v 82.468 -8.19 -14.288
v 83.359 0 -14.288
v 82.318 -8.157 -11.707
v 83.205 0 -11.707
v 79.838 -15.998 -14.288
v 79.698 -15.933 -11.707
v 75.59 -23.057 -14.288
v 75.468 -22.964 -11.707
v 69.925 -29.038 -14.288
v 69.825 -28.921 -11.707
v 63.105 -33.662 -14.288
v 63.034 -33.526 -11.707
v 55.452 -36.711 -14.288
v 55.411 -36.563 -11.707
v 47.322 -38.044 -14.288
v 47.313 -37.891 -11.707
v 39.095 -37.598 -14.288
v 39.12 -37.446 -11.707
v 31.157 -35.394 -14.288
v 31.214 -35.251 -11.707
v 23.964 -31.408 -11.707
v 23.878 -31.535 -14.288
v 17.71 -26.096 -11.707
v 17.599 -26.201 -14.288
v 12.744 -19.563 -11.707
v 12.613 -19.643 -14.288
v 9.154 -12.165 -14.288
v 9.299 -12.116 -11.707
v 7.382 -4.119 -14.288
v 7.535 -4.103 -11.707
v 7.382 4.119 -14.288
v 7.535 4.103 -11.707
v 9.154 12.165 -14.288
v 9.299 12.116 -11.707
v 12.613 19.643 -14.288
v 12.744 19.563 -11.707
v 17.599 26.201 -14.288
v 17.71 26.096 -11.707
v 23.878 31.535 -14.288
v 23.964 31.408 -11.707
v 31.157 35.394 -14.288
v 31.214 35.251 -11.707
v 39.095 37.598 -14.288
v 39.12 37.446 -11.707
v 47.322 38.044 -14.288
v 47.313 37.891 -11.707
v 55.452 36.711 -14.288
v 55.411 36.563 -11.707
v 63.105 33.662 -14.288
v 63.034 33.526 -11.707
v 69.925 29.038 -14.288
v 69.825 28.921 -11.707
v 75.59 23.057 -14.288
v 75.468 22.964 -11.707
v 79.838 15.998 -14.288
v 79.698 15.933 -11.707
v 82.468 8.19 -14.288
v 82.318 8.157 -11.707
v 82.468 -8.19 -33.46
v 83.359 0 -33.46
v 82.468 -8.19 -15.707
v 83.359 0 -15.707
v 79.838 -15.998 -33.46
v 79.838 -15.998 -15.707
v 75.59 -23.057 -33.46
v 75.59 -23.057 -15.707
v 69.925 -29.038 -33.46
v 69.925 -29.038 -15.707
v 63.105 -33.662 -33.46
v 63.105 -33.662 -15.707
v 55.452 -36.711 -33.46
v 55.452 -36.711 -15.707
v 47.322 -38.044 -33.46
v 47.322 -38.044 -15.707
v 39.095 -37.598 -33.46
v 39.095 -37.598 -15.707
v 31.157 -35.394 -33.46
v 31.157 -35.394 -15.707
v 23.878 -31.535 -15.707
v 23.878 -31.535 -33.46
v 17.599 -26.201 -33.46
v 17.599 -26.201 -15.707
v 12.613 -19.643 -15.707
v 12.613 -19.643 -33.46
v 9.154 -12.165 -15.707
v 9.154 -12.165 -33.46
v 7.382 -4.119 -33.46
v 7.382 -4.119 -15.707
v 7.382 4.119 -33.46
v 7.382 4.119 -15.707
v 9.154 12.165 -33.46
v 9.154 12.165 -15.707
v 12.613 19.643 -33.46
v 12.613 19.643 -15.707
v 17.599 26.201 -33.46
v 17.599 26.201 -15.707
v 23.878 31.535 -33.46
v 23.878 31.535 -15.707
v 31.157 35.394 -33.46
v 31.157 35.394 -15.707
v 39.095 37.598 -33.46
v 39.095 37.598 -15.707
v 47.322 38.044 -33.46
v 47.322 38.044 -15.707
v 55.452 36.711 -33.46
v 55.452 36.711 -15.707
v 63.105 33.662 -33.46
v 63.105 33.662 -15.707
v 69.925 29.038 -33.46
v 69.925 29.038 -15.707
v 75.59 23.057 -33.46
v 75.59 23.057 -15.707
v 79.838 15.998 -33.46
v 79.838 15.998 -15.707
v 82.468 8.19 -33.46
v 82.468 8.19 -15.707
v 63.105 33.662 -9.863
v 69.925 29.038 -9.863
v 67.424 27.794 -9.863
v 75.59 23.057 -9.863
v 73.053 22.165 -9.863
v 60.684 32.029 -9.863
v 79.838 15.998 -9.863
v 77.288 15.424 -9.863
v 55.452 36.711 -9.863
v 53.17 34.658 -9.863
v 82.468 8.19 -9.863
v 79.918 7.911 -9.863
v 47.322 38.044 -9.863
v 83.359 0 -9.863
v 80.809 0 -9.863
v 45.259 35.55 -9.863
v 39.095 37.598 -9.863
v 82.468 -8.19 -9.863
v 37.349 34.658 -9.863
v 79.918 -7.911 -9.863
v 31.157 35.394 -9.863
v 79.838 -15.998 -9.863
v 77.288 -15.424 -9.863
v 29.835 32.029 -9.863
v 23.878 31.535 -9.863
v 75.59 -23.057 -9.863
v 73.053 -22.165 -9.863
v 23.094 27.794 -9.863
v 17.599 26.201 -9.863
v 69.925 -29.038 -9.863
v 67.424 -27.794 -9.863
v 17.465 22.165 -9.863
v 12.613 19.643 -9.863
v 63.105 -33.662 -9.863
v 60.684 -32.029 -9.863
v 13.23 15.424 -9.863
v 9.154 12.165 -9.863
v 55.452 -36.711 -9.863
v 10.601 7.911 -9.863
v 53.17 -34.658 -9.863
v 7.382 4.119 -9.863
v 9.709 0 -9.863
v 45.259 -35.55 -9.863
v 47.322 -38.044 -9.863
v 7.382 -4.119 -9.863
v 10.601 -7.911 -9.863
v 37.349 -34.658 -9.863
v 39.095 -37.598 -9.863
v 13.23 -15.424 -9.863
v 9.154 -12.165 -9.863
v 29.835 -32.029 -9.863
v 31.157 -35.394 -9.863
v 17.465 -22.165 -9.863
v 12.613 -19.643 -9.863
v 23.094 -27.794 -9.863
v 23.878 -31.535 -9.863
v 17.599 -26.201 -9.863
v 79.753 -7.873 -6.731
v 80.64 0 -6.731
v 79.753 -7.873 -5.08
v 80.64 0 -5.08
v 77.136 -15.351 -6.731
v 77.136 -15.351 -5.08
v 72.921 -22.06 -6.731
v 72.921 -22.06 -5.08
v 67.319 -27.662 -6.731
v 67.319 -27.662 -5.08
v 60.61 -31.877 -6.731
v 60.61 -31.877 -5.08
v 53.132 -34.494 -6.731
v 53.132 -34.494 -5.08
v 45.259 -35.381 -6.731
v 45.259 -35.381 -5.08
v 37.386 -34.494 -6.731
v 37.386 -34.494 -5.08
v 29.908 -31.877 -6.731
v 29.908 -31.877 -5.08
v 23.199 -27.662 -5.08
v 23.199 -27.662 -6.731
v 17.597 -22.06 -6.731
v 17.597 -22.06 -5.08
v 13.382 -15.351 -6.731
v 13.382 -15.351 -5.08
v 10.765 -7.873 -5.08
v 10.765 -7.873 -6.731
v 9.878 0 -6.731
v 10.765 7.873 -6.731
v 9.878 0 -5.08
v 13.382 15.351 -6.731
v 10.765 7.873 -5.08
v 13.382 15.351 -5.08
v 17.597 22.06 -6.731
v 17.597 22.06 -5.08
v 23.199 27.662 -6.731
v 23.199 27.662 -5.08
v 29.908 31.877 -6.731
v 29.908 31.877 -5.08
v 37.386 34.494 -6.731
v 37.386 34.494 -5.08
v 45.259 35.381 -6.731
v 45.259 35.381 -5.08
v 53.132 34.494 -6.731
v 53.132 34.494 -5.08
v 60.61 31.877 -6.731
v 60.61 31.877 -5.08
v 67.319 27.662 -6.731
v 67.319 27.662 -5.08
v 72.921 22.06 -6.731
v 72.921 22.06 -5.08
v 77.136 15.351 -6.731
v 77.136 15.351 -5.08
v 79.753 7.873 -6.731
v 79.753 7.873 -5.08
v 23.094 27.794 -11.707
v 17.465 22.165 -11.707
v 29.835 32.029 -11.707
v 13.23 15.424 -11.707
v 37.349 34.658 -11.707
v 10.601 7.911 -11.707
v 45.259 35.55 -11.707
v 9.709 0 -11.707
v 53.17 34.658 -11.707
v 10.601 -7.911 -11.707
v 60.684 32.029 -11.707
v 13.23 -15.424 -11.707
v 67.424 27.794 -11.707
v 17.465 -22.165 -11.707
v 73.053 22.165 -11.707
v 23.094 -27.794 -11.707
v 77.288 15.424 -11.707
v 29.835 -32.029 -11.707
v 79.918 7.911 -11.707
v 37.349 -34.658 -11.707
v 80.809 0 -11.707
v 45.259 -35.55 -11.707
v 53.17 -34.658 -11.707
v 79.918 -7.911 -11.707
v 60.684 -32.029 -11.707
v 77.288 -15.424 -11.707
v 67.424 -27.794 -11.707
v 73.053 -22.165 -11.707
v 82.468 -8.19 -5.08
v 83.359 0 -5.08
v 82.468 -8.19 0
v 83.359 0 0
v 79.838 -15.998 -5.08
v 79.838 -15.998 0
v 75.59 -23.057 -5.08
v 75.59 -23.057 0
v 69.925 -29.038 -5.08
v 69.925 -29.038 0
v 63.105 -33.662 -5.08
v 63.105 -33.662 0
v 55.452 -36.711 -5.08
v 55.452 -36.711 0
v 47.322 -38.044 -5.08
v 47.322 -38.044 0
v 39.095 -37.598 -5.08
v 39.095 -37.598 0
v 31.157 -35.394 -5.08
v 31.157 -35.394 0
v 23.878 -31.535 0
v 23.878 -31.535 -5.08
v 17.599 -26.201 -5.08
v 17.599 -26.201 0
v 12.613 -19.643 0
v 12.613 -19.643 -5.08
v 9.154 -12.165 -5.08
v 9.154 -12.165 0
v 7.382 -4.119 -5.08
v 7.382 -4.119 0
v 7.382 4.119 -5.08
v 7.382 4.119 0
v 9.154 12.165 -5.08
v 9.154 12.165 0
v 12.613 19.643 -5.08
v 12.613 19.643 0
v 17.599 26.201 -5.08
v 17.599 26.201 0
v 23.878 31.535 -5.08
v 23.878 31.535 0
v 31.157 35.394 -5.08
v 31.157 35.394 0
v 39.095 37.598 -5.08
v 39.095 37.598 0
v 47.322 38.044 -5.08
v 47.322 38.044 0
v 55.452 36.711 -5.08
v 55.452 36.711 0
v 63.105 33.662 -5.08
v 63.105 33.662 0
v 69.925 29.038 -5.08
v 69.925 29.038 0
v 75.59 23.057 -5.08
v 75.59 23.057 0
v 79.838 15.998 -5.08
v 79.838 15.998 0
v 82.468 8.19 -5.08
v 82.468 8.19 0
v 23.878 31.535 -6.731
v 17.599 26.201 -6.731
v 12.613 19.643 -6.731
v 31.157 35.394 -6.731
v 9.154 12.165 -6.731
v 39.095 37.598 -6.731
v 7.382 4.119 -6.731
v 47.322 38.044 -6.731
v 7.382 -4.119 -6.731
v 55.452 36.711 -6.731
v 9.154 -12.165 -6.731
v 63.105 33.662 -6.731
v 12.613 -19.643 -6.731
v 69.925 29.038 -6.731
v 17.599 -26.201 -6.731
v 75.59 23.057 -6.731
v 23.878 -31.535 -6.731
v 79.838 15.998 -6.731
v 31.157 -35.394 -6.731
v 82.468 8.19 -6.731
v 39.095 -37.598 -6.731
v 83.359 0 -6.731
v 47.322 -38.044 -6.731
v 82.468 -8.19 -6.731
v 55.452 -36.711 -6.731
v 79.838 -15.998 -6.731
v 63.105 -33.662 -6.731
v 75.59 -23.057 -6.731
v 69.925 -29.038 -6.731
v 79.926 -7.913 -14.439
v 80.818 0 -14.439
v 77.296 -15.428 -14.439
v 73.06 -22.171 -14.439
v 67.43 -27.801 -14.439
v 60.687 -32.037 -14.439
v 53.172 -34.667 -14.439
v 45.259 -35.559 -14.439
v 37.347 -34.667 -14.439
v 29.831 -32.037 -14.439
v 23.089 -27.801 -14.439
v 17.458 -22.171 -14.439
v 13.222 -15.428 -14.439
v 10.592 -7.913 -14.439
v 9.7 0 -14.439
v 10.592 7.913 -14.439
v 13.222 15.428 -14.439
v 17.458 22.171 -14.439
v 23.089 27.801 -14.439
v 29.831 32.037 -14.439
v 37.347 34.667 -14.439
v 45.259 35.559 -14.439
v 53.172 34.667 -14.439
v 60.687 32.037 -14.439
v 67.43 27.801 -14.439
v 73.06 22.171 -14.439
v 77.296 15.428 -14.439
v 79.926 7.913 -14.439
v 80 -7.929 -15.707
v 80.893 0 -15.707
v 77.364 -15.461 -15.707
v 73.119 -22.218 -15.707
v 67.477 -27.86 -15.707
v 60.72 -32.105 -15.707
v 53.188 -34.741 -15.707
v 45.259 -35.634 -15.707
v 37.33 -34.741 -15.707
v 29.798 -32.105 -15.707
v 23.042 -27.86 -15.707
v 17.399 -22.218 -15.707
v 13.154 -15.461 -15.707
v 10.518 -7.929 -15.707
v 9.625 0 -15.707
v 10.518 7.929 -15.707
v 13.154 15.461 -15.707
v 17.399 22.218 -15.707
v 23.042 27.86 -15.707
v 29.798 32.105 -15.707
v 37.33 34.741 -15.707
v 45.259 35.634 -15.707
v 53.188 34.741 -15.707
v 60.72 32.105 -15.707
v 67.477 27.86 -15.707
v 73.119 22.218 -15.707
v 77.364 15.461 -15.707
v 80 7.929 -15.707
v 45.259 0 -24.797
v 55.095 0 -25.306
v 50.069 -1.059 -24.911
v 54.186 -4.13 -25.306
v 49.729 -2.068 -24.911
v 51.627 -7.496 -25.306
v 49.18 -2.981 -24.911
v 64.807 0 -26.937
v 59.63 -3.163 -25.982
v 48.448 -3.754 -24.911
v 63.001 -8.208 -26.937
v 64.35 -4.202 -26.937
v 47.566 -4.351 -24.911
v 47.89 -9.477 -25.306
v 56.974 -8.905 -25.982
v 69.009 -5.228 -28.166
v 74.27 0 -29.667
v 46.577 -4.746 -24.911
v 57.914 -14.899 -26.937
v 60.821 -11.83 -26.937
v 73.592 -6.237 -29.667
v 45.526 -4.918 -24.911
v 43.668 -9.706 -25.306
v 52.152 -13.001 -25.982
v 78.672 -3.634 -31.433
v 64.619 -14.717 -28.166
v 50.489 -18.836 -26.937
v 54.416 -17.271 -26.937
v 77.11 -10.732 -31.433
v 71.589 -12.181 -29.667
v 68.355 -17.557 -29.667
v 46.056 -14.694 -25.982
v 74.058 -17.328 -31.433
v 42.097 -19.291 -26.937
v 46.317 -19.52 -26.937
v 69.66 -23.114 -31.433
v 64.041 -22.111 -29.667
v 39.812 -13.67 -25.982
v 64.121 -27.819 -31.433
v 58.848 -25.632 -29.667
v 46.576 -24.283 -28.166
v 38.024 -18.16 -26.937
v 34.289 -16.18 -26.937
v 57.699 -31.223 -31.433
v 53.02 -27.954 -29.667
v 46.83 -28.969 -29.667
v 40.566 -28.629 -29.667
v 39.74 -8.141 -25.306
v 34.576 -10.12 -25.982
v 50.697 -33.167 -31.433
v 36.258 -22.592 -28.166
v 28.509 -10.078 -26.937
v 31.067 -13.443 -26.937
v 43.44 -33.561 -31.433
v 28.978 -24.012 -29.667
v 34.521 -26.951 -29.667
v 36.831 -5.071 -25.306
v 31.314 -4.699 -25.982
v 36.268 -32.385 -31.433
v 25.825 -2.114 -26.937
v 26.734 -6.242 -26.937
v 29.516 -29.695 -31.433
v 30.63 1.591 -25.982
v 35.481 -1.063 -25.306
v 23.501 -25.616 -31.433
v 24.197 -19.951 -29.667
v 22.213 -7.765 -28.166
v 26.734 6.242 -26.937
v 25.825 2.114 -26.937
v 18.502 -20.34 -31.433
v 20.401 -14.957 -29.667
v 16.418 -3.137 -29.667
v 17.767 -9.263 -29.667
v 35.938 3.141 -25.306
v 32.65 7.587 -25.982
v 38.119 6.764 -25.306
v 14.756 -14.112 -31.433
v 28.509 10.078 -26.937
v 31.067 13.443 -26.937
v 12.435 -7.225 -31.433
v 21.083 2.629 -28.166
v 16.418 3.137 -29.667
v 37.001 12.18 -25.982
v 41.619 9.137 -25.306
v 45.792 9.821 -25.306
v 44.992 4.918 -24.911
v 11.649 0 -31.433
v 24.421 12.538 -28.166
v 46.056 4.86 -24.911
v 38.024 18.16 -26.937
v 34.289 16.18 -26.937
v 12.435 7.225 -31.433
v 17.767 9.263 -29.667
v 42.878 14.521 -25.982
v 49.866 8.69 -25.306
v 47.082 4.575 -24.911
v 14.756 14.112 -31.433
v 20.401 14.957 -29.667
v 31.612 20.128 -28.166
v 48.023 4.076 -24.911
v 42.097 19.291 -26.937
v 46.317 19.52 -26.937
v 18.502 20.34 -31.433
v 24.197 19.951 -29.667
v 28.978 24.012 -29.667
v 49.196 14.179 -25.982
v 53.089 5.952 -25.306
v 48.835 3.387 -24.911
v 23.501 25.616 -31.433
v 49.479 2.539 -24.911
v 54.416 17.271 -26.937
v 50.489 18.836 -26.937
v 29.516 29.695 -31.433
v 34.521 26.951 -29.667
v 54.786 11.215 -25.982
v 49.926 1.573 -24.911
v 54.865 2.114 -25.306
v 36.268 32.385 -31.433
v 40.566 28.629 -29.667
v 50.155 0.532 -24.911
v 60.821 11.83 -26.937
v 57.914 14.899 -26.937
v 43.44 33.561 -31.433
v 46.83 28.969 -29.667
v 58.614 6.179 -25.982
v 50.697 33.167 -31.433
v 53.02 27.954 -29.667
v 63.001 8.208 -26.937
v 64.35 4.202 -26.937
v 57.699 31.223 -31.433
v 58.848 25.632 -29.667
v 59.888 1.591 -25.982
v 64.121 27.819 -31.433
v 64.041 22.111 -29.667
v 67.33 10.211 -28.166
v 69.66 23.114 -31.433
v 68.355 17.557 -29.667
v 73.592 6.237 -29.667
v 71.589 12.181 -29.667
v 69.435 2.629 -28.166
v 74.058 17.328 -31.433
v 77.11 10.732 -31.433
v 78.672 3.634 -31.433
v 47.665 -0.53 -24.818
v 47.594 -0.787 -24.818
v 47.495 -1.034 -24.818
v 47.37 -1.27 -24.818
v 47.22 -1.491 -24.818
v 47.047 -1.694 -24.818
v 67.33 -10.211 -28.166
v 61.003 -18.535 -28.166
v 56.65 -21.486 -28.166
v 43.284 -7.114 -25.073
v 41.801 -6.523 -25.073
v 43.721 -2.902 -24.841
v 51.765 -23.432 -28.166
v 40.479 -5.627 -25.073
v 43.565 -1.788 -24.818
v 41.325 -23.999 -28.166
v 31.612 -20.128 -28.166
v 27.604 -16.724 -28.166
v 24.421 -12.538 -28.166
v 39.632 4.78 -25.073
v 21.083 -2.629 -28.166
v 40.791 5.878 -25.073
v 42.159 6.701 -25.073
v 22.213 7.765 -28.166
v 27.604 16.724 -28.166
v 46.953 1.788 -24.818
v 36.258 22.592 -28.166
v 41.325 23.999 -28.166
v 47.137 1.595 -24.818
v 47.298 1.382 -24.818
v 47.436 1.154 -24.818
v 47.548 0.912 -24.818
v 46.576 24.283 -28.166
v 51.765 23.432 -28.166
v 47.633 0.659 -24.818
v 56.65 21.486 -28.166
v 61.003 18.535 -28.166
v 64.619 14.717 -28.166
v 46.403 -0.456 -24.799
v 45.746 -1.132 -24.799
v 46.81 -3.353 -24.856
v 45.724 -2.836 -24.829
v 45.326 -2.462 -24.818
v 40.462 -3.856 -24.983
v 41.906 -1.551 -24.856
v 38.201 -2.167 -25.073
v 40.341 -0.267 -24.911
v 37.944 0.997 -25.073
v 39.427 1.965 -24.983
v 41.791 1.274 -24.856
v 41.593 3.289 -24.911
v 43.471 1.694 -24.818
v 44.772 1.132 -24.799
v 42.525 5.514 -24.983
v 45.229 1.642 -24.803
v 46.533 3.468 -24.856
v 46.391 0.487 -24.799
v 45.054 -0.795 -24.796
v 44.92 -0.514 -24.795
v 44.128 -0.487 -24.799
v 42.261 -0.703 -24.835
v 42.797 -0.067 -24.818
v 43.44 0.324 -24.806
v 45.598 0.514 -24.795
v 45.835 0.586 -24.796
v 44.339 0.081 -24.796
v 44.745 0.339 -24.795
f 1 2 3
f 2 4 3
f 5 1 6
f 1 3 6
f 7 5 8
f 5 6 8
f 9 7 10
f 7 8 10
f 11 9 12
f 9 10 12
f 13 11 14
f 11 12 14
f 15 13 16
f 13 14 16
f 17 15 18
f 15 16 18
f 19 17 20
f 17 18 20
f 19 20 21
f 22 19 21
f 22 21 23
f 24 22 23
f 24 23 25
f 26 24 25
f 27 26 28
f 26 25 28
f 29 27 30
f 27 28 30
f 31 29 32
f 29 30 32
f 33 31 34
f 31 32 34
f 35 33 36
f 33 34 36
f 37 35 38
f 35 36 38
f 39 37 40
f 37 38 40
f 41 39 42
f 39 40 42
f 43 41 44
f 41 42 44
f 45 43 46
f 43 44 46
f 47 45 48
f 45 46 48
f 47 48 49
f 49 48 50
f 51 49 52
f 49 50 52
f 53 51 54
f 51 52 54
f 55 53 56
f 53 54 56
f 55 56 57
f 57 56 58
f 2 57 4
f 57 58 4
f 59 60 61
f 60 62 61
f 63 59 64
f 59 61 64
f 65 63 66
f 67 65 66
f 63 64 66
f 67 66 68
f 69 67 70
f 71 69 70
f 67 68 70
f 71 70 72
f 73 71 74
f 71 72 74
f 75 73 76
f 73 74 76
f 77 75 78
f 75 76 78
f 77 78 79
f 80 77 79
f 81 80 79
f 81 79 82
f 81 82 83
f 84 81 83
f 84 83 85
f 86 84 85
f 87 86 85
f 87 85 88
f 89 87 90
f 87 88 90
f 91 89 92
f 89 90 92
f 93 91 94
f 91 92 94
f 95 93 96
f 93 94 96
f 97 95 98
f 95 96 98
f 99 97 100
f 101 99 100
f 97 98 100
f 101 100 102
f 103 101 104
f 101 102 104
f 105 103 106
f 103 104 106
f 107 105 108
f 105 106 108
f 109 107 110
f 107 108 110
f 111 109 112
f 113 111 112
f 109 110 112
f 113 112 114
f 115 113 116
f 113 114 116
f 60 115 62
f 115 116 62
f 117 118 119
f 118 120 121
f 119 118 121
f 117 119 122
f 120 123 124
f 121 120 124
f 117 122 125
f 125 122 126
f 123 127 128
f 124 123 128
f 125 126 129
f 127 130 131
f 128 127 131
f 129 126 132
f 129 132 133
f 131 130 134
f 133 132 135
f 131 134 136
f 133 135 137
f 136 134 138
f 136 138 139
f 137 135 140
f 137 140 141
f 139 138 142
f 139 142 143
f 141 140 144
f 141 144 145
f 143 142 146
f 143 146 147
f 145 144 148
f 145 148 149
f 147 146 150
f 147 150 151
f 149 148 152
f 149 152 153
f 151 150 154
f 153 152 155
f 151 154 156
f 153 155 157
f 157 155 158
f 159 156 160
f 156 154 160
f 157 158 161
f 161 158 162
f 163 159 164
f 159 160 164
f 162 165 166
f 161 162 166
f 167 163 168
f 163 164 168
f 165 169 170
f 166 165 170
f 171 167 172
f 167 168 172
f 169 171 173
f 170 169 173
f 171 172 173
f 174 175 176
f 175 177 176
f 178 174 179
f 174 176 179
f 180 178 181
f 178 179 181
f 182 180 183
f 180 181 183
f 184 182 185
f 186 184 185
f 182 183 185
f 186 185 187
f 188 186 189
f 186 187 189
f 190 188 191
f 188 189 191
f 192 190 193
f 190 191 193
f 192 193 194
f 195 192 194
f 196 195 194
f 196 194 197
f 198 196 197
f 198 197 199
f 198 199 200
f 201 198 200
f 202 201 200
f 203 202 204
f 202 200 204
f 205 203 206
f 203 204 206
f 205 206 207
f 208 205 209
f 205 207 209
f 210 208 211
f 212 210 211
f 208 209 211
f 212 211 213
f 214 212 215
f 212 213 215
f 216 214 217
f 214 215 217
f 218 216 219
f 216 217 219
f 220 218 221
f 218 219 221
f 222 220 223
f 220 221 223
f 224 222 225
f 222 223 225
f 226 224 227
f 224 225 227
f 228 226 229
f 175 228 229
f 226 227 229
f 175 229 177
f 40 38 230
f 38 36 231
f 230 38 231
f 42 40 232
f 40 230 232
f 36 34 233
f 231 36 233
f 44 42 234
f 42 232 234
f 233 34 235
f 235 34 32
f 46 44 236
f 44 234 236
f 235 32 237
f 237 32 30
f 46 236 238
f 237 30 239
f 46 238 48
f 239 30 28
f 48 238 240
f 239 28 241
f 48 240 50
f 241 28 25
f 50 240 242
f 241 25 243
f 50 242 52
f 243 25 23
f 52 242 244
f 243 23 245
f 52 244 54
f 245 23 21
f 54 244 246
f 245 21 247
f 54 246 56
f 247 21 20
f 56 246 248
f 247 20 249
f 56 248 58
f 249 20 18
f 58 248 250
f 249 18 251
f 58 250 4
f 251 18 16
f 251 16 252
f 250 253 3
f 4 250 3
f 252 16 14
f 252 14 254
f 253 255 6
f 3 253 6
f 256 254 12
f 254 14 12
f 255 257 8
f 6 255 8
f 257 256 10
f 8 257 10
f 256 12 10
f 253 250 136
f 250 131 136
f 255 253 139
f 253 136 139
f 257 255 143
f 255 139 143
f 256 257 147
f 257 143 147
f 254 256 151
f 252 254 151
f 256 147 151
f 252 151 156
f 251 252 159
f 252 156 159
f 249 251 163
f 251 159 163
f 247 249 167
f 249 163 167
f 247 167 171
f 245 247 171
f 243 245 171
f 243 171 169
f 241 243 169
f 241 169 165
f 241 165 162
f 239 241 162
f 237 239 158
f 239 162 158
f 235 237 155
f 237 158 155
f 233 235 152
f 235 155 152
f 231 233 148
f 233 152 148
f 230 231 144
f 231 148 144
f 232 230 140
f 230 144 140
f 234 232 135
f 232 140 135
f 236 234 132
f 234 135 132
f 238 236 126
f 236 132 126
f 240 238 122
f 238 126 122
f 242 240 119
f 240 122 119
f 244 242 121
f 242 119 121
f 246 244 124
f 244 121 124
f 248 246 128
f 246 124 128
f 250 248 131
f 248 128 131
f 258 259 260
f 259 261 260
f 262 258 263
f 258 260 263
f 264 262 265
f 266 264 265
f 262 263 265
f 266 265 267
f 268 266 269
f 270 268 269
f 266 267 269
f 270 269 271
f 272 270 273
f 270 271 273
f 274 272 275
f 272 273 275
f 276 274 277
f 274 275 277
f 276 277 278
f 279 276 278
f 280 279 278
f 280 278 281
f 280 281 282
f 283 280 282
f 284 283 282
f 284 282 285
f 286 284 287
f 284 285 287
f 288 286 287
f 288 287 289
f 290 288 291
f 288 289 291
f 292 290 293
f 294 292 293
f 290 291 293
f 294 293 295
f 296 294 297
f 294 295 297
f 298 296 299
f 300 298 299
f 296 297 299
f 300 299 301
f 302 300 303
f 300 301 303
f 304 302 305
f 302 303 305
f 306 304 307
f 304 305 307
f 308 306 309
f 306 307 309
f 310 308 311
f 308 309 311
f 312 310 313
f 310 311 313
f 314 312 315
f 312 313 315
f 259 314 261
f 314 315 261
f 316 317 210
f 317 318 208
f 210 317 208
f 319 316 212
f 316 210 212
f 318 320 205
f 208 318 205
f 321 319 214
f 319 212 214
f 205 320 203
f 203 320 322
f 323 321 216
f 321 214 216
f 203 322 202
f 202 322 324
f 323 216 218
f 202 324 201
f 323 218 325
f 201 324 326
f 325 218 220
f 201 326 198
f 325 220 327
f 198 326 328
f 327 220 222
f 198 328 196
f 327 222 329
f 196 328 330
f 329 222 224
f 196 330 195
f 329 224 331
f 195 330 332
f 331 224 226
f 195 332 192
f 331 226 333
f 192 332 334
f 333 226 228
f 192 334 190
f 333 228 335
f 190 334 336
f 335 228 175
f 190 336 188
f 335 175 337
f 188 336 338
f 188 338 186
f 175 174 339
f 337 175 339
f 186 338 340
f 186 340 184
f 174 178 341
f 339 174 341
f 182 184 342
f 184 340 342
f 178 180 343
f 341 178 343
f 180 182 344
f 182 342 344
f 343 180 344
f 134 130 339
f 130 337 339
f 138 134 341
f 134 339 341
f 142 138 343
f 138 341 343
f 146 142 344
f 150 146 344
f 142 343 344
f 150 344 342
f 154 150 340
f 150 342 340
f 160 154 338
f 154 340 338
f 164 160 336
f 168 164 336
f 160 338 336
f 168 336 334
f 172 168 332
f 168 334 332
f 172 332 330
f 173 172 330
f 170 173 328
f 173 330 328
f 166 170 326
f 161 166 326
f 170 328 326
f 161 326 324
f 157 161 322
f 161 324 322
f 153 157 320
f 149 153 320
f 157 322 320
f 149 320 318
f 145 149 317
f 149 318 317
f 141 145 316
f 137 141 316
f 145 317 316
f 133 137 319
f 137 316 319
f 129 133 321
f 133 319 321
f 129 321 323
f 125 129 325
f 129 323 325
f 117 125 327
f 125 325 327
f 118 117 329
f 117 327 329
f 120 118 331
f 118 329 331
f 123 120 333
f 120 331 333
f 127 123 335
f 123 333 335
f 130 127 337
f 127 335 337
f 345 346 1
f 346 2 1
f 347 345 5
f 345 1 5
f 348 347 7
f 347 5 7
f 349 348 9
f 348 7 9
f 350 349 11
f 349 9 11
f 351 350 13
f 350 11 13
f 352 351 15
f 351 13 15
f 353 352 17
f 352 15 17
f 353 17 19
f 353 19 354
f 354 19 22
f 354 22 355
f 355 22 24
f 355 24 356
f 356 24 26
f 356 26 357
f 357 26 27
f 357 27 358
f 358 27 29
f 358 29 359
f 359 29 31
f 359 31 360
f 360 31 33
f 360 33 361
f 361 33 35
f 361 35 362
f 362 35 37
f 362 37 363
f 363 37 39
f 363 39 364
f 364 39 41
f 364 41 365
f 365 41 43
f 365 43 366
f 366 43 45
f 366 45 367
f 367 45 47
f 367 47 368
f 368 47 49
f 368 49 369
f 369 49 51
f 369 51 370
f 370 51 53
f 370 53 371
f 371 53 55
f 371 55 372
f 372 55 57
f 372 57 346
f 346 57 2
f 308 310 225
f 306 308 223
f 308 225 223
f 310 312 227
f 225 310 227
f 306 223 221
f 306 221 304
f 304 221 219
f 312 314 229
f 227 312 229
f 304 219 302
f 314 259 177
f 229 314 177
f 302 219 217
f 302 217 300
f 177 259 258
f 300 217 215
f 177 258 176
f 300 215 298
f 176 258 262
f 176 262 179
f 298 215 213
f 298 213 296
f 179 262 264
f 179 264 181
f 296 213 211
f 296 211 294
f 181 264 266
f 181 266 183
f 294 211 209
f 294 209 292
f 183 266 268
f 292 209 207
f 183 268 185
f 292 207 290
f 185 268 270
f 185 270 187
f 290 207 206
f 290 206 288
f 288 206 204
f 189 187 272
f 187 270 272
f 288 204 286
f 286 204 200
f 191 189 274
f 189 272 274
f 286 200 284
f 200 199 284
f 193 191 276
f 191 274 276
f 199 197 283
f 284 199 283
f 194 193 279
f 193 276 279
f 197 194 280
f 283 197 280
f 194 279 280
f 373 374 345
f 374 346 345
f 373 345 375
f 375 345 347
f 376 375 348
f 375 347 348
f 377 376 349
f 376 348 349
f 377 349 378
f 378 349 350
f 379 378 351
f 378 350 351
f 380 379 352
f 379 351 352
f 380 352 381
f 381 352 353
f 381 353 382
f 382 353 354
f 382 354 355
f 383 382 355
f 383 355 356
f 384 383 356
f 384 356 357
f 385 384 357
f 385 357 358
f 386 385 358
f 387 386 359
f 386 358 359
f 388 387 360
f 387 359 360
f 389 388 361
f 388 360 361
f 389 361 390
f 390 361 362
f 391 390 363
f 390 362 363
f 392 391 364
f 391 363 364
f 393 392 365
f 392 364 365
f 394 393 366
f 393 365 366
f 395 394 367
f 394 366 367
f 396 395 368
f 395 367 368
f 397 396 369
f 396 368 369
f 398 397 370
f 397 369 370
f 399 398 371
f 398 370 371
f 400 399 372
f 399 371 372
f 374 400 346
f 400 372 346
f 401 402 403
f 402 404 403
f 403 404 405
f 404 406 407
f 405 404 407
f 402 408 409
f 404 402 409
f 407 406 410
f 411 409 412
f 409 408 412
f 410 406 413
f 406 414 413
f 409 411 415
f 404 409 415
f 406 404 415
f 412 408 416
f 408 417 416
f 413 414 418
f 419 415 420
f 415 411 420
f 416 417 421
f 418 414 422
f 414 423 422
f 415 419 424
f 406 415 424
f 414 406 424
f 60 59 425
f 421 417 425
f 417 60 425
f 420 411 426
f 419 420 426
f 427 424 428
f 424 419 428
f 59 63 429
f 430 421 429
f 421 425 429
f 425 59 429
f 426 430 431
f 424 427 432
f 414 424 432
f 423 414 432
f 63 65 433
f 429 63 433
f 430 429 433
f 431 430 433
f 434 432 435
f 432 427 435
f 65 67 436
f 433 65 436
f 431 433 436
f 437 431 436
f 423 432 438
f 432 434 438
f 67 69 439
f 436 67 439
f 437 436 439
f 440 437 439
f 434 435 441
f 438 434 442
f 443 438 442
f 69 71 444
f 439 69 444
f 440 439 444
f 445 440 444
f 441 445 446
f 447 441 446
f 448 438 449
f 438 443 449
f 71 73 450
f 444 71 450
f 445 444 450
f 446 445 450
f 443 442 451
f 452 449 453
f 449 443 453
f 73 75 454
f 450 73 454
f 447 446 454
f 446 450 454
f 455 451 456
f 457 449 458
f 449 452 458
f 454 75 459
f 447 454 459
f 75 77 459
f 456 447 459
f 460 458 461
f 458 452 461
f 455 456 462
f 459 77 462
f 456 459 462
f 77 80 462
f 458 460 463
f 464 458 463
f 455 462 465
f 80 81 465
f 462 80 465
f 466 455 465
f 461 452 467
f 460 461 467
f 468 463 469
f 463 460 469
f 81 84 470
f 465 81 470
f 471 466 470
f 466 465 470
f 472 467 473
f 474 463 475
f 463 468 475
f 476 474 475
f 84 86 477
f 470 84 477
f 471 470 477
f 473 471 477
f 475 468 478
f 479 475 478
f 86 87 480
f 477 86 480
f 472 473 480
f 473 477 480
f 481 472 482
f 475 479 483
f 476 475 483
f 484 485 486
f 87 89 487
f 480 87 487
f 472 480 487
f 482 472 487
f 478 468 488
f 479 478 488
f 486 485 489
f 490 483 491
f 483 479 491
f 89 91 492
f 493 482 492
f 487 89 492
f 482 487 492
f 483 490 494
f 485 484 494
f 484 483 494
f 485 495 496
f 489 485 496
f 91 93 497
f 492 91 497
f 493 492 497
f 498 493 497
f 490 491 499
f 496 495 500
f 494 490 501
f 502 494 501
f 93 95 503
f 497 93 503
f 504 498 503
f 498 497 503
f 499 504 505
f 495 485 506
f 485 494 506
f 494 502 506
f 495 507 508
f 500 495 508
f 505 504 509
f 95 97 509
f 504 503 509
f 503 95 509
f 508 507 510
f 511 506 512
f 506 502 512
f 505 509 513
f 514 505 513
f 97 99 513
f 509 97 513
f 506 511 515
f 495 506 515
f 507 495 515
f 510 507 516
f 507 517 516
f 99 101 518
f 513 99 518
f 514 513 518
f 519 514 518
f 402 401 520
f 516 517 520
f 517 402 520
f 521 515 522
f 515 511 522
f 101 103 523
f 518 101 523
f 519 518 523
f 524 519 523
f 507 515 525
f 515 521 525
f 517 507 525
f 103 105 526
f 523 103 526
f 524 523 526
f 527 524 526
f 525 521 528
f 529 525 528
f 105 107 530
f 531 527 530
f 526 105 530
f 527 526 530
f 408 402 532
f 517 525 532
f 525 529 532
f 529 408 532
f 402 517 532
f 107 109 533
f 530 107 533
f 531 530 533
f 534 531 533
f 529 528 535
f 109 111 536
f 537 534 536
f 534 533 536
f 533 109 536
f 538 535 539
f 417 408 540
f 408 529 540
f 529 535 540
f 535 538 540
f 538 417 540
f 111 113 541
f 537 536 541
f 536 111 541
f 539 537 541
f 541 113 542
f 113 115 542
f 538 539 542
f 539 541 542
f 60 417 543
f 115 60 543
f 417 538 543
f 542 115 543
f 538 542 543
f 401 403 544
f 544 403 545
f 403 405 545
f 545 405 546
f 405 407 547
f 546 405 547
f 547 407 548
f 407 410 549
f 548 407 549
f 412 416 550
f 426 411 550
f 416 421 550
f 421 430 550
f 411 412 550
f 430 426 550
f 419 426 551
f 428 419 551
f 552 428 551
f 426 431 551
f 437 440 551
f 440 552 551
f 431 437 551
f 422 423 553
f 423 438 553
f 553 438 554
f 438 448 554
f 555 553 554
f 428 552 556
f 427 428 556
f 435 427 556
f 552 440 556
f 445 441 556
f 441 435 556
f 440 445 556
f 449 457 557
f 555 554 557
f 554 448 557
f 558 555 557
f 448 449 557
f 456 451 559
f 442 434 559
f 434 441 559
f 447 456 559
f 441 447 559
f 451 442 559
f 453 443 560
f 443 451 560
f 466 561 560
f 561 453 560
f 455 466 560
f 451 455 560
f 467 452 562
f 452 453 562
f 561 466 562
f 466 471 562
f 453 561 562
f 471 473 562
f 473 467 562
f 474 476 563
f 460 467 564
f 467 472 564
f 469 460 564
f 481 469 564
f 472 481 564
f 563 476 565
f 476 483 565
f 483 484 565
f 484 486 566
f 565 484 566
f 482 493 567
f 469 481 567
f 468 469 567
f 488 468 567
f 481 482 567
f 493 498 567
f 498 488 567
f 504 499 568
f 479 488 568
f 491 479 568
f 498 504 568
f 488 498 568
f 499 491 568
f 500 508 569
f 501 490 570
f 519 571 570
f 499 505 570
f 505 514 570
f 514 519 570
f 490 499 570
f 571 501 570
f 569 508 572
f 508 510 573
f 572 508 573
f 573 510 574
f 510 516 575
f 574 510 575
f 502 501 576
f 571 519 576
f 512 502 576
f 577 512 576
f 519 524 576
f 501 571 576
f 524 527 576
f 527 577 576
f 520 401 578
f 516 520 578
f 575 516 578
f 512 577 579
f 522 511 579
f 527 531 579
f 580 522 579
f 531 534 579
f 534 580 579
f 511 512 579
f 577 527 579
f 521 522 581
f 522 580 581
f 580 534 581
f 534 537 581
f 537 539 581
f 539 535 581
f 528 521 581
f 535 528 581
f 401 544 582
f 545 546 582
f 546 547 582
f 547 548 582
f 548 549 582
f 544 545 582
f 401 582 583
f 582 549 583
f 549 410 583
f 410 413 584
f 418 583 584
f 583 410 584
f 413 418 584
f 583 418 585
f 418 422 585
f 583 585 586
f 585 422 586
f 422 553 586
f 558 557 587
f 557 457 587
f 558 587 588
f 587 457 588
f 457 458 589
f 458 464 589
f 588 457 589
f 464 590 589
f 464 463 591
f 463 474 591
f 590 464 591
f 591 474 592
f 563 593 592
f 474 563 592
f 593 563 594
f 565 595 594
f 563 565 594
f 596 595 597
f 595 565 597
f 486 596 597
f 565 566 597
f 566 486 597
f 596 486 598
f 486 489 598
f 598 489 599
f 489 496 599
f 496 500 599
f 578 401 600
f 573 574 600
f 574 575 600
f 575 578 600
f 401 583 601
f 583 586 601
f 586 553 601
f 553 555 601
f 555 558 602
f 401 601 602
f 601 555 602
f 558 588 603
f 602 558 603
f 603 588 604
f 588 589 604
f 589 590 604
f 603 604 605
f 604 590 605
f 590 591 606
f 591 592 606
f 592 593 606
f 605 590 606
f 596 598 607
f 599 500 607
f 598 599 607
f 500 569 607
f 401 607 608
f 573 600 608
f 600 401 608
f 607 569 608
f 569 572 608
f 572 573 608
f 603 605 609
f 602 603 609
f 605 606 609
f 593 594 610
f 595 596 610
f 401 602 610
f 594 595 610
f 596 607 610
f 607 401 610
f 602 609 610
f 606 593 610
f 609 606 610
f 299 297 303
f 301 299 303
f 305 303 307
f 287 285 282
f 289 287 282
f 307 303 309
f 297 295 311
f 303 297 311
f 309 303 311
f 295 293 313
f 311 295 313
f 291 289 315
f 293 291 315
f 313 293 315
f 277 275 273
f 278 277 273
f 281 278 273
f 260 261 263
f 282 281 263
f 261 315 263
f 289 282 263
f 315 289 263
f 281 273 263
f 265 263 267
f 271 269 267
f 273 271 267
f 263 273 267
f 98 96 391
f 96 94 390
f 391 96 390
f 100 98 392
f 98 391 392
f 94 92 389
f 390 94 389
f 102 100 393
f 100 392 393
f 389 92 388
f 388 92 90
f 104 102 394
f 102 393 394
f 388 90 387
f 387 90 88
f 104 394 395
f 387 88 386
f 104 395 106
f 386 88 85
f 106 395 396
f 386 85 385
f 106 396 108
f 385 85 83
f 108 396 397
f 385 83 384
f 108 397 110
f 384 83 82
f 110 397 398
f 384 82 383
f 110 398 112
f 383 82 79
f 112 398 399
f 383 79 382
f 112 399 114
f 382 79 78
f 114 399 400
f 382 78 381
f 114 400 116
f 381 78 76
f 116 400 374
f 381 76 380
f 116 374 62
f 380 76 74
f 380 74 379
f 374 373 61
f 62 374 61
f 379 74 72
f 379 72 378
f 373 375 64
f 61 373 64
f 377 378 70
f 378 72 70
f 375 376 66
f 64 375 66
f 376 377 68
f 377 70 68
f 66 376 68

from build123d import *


with BuildPart() as f1:
    # F0 (on Front) → F1 (revolve)
    with BuildSketch(Plane.XZ):
        with BuildLine():
            Line((83.359114, -5.08), (83.359114, 0))
            Line((83.359114, 0), (45.259114, 0))
            Line((45.259114, 0), (45.259114, -24.796592))
            ThreePointArc((45.259114, -24.796592), (64.807486, -26.936857), (83.359114, -33.460405))
            Line((83.359114, -33.460405), (83.359114, -15.706522))
            Line((83.359114, -15.706522), (80.893344, -15.706522))
            Line((80.893344, -15.706522), (80.817882, -14.438765))
            Line((80.817882, -14.438765), (83.359114, -14.287501))
            Line((83.359114, -14.287501), (83.205484, -11.706533))
            Line((83.205484, -11.706533), (80.808878, -11.706533))
            Line((80.808878, -11.706533), (80.808878, -9.862984))
            Line((80.808878, -9.862984), (83.359114, -9.862984))
            Line((83.359114, -9.862984), (83.359114, -6.731))
            Line((83.359114, -6.731), (80.640316, -6.731))
            Line((80.640316, -6.731), (80.640316, -5.08))
            Line((80.640316, -5.08), (83.359114, -5.08))
        make_face()
    revolve(axis=Axis((45.259114, 0, -12.398296), (0, 0, -1)))


solid = f1.part
